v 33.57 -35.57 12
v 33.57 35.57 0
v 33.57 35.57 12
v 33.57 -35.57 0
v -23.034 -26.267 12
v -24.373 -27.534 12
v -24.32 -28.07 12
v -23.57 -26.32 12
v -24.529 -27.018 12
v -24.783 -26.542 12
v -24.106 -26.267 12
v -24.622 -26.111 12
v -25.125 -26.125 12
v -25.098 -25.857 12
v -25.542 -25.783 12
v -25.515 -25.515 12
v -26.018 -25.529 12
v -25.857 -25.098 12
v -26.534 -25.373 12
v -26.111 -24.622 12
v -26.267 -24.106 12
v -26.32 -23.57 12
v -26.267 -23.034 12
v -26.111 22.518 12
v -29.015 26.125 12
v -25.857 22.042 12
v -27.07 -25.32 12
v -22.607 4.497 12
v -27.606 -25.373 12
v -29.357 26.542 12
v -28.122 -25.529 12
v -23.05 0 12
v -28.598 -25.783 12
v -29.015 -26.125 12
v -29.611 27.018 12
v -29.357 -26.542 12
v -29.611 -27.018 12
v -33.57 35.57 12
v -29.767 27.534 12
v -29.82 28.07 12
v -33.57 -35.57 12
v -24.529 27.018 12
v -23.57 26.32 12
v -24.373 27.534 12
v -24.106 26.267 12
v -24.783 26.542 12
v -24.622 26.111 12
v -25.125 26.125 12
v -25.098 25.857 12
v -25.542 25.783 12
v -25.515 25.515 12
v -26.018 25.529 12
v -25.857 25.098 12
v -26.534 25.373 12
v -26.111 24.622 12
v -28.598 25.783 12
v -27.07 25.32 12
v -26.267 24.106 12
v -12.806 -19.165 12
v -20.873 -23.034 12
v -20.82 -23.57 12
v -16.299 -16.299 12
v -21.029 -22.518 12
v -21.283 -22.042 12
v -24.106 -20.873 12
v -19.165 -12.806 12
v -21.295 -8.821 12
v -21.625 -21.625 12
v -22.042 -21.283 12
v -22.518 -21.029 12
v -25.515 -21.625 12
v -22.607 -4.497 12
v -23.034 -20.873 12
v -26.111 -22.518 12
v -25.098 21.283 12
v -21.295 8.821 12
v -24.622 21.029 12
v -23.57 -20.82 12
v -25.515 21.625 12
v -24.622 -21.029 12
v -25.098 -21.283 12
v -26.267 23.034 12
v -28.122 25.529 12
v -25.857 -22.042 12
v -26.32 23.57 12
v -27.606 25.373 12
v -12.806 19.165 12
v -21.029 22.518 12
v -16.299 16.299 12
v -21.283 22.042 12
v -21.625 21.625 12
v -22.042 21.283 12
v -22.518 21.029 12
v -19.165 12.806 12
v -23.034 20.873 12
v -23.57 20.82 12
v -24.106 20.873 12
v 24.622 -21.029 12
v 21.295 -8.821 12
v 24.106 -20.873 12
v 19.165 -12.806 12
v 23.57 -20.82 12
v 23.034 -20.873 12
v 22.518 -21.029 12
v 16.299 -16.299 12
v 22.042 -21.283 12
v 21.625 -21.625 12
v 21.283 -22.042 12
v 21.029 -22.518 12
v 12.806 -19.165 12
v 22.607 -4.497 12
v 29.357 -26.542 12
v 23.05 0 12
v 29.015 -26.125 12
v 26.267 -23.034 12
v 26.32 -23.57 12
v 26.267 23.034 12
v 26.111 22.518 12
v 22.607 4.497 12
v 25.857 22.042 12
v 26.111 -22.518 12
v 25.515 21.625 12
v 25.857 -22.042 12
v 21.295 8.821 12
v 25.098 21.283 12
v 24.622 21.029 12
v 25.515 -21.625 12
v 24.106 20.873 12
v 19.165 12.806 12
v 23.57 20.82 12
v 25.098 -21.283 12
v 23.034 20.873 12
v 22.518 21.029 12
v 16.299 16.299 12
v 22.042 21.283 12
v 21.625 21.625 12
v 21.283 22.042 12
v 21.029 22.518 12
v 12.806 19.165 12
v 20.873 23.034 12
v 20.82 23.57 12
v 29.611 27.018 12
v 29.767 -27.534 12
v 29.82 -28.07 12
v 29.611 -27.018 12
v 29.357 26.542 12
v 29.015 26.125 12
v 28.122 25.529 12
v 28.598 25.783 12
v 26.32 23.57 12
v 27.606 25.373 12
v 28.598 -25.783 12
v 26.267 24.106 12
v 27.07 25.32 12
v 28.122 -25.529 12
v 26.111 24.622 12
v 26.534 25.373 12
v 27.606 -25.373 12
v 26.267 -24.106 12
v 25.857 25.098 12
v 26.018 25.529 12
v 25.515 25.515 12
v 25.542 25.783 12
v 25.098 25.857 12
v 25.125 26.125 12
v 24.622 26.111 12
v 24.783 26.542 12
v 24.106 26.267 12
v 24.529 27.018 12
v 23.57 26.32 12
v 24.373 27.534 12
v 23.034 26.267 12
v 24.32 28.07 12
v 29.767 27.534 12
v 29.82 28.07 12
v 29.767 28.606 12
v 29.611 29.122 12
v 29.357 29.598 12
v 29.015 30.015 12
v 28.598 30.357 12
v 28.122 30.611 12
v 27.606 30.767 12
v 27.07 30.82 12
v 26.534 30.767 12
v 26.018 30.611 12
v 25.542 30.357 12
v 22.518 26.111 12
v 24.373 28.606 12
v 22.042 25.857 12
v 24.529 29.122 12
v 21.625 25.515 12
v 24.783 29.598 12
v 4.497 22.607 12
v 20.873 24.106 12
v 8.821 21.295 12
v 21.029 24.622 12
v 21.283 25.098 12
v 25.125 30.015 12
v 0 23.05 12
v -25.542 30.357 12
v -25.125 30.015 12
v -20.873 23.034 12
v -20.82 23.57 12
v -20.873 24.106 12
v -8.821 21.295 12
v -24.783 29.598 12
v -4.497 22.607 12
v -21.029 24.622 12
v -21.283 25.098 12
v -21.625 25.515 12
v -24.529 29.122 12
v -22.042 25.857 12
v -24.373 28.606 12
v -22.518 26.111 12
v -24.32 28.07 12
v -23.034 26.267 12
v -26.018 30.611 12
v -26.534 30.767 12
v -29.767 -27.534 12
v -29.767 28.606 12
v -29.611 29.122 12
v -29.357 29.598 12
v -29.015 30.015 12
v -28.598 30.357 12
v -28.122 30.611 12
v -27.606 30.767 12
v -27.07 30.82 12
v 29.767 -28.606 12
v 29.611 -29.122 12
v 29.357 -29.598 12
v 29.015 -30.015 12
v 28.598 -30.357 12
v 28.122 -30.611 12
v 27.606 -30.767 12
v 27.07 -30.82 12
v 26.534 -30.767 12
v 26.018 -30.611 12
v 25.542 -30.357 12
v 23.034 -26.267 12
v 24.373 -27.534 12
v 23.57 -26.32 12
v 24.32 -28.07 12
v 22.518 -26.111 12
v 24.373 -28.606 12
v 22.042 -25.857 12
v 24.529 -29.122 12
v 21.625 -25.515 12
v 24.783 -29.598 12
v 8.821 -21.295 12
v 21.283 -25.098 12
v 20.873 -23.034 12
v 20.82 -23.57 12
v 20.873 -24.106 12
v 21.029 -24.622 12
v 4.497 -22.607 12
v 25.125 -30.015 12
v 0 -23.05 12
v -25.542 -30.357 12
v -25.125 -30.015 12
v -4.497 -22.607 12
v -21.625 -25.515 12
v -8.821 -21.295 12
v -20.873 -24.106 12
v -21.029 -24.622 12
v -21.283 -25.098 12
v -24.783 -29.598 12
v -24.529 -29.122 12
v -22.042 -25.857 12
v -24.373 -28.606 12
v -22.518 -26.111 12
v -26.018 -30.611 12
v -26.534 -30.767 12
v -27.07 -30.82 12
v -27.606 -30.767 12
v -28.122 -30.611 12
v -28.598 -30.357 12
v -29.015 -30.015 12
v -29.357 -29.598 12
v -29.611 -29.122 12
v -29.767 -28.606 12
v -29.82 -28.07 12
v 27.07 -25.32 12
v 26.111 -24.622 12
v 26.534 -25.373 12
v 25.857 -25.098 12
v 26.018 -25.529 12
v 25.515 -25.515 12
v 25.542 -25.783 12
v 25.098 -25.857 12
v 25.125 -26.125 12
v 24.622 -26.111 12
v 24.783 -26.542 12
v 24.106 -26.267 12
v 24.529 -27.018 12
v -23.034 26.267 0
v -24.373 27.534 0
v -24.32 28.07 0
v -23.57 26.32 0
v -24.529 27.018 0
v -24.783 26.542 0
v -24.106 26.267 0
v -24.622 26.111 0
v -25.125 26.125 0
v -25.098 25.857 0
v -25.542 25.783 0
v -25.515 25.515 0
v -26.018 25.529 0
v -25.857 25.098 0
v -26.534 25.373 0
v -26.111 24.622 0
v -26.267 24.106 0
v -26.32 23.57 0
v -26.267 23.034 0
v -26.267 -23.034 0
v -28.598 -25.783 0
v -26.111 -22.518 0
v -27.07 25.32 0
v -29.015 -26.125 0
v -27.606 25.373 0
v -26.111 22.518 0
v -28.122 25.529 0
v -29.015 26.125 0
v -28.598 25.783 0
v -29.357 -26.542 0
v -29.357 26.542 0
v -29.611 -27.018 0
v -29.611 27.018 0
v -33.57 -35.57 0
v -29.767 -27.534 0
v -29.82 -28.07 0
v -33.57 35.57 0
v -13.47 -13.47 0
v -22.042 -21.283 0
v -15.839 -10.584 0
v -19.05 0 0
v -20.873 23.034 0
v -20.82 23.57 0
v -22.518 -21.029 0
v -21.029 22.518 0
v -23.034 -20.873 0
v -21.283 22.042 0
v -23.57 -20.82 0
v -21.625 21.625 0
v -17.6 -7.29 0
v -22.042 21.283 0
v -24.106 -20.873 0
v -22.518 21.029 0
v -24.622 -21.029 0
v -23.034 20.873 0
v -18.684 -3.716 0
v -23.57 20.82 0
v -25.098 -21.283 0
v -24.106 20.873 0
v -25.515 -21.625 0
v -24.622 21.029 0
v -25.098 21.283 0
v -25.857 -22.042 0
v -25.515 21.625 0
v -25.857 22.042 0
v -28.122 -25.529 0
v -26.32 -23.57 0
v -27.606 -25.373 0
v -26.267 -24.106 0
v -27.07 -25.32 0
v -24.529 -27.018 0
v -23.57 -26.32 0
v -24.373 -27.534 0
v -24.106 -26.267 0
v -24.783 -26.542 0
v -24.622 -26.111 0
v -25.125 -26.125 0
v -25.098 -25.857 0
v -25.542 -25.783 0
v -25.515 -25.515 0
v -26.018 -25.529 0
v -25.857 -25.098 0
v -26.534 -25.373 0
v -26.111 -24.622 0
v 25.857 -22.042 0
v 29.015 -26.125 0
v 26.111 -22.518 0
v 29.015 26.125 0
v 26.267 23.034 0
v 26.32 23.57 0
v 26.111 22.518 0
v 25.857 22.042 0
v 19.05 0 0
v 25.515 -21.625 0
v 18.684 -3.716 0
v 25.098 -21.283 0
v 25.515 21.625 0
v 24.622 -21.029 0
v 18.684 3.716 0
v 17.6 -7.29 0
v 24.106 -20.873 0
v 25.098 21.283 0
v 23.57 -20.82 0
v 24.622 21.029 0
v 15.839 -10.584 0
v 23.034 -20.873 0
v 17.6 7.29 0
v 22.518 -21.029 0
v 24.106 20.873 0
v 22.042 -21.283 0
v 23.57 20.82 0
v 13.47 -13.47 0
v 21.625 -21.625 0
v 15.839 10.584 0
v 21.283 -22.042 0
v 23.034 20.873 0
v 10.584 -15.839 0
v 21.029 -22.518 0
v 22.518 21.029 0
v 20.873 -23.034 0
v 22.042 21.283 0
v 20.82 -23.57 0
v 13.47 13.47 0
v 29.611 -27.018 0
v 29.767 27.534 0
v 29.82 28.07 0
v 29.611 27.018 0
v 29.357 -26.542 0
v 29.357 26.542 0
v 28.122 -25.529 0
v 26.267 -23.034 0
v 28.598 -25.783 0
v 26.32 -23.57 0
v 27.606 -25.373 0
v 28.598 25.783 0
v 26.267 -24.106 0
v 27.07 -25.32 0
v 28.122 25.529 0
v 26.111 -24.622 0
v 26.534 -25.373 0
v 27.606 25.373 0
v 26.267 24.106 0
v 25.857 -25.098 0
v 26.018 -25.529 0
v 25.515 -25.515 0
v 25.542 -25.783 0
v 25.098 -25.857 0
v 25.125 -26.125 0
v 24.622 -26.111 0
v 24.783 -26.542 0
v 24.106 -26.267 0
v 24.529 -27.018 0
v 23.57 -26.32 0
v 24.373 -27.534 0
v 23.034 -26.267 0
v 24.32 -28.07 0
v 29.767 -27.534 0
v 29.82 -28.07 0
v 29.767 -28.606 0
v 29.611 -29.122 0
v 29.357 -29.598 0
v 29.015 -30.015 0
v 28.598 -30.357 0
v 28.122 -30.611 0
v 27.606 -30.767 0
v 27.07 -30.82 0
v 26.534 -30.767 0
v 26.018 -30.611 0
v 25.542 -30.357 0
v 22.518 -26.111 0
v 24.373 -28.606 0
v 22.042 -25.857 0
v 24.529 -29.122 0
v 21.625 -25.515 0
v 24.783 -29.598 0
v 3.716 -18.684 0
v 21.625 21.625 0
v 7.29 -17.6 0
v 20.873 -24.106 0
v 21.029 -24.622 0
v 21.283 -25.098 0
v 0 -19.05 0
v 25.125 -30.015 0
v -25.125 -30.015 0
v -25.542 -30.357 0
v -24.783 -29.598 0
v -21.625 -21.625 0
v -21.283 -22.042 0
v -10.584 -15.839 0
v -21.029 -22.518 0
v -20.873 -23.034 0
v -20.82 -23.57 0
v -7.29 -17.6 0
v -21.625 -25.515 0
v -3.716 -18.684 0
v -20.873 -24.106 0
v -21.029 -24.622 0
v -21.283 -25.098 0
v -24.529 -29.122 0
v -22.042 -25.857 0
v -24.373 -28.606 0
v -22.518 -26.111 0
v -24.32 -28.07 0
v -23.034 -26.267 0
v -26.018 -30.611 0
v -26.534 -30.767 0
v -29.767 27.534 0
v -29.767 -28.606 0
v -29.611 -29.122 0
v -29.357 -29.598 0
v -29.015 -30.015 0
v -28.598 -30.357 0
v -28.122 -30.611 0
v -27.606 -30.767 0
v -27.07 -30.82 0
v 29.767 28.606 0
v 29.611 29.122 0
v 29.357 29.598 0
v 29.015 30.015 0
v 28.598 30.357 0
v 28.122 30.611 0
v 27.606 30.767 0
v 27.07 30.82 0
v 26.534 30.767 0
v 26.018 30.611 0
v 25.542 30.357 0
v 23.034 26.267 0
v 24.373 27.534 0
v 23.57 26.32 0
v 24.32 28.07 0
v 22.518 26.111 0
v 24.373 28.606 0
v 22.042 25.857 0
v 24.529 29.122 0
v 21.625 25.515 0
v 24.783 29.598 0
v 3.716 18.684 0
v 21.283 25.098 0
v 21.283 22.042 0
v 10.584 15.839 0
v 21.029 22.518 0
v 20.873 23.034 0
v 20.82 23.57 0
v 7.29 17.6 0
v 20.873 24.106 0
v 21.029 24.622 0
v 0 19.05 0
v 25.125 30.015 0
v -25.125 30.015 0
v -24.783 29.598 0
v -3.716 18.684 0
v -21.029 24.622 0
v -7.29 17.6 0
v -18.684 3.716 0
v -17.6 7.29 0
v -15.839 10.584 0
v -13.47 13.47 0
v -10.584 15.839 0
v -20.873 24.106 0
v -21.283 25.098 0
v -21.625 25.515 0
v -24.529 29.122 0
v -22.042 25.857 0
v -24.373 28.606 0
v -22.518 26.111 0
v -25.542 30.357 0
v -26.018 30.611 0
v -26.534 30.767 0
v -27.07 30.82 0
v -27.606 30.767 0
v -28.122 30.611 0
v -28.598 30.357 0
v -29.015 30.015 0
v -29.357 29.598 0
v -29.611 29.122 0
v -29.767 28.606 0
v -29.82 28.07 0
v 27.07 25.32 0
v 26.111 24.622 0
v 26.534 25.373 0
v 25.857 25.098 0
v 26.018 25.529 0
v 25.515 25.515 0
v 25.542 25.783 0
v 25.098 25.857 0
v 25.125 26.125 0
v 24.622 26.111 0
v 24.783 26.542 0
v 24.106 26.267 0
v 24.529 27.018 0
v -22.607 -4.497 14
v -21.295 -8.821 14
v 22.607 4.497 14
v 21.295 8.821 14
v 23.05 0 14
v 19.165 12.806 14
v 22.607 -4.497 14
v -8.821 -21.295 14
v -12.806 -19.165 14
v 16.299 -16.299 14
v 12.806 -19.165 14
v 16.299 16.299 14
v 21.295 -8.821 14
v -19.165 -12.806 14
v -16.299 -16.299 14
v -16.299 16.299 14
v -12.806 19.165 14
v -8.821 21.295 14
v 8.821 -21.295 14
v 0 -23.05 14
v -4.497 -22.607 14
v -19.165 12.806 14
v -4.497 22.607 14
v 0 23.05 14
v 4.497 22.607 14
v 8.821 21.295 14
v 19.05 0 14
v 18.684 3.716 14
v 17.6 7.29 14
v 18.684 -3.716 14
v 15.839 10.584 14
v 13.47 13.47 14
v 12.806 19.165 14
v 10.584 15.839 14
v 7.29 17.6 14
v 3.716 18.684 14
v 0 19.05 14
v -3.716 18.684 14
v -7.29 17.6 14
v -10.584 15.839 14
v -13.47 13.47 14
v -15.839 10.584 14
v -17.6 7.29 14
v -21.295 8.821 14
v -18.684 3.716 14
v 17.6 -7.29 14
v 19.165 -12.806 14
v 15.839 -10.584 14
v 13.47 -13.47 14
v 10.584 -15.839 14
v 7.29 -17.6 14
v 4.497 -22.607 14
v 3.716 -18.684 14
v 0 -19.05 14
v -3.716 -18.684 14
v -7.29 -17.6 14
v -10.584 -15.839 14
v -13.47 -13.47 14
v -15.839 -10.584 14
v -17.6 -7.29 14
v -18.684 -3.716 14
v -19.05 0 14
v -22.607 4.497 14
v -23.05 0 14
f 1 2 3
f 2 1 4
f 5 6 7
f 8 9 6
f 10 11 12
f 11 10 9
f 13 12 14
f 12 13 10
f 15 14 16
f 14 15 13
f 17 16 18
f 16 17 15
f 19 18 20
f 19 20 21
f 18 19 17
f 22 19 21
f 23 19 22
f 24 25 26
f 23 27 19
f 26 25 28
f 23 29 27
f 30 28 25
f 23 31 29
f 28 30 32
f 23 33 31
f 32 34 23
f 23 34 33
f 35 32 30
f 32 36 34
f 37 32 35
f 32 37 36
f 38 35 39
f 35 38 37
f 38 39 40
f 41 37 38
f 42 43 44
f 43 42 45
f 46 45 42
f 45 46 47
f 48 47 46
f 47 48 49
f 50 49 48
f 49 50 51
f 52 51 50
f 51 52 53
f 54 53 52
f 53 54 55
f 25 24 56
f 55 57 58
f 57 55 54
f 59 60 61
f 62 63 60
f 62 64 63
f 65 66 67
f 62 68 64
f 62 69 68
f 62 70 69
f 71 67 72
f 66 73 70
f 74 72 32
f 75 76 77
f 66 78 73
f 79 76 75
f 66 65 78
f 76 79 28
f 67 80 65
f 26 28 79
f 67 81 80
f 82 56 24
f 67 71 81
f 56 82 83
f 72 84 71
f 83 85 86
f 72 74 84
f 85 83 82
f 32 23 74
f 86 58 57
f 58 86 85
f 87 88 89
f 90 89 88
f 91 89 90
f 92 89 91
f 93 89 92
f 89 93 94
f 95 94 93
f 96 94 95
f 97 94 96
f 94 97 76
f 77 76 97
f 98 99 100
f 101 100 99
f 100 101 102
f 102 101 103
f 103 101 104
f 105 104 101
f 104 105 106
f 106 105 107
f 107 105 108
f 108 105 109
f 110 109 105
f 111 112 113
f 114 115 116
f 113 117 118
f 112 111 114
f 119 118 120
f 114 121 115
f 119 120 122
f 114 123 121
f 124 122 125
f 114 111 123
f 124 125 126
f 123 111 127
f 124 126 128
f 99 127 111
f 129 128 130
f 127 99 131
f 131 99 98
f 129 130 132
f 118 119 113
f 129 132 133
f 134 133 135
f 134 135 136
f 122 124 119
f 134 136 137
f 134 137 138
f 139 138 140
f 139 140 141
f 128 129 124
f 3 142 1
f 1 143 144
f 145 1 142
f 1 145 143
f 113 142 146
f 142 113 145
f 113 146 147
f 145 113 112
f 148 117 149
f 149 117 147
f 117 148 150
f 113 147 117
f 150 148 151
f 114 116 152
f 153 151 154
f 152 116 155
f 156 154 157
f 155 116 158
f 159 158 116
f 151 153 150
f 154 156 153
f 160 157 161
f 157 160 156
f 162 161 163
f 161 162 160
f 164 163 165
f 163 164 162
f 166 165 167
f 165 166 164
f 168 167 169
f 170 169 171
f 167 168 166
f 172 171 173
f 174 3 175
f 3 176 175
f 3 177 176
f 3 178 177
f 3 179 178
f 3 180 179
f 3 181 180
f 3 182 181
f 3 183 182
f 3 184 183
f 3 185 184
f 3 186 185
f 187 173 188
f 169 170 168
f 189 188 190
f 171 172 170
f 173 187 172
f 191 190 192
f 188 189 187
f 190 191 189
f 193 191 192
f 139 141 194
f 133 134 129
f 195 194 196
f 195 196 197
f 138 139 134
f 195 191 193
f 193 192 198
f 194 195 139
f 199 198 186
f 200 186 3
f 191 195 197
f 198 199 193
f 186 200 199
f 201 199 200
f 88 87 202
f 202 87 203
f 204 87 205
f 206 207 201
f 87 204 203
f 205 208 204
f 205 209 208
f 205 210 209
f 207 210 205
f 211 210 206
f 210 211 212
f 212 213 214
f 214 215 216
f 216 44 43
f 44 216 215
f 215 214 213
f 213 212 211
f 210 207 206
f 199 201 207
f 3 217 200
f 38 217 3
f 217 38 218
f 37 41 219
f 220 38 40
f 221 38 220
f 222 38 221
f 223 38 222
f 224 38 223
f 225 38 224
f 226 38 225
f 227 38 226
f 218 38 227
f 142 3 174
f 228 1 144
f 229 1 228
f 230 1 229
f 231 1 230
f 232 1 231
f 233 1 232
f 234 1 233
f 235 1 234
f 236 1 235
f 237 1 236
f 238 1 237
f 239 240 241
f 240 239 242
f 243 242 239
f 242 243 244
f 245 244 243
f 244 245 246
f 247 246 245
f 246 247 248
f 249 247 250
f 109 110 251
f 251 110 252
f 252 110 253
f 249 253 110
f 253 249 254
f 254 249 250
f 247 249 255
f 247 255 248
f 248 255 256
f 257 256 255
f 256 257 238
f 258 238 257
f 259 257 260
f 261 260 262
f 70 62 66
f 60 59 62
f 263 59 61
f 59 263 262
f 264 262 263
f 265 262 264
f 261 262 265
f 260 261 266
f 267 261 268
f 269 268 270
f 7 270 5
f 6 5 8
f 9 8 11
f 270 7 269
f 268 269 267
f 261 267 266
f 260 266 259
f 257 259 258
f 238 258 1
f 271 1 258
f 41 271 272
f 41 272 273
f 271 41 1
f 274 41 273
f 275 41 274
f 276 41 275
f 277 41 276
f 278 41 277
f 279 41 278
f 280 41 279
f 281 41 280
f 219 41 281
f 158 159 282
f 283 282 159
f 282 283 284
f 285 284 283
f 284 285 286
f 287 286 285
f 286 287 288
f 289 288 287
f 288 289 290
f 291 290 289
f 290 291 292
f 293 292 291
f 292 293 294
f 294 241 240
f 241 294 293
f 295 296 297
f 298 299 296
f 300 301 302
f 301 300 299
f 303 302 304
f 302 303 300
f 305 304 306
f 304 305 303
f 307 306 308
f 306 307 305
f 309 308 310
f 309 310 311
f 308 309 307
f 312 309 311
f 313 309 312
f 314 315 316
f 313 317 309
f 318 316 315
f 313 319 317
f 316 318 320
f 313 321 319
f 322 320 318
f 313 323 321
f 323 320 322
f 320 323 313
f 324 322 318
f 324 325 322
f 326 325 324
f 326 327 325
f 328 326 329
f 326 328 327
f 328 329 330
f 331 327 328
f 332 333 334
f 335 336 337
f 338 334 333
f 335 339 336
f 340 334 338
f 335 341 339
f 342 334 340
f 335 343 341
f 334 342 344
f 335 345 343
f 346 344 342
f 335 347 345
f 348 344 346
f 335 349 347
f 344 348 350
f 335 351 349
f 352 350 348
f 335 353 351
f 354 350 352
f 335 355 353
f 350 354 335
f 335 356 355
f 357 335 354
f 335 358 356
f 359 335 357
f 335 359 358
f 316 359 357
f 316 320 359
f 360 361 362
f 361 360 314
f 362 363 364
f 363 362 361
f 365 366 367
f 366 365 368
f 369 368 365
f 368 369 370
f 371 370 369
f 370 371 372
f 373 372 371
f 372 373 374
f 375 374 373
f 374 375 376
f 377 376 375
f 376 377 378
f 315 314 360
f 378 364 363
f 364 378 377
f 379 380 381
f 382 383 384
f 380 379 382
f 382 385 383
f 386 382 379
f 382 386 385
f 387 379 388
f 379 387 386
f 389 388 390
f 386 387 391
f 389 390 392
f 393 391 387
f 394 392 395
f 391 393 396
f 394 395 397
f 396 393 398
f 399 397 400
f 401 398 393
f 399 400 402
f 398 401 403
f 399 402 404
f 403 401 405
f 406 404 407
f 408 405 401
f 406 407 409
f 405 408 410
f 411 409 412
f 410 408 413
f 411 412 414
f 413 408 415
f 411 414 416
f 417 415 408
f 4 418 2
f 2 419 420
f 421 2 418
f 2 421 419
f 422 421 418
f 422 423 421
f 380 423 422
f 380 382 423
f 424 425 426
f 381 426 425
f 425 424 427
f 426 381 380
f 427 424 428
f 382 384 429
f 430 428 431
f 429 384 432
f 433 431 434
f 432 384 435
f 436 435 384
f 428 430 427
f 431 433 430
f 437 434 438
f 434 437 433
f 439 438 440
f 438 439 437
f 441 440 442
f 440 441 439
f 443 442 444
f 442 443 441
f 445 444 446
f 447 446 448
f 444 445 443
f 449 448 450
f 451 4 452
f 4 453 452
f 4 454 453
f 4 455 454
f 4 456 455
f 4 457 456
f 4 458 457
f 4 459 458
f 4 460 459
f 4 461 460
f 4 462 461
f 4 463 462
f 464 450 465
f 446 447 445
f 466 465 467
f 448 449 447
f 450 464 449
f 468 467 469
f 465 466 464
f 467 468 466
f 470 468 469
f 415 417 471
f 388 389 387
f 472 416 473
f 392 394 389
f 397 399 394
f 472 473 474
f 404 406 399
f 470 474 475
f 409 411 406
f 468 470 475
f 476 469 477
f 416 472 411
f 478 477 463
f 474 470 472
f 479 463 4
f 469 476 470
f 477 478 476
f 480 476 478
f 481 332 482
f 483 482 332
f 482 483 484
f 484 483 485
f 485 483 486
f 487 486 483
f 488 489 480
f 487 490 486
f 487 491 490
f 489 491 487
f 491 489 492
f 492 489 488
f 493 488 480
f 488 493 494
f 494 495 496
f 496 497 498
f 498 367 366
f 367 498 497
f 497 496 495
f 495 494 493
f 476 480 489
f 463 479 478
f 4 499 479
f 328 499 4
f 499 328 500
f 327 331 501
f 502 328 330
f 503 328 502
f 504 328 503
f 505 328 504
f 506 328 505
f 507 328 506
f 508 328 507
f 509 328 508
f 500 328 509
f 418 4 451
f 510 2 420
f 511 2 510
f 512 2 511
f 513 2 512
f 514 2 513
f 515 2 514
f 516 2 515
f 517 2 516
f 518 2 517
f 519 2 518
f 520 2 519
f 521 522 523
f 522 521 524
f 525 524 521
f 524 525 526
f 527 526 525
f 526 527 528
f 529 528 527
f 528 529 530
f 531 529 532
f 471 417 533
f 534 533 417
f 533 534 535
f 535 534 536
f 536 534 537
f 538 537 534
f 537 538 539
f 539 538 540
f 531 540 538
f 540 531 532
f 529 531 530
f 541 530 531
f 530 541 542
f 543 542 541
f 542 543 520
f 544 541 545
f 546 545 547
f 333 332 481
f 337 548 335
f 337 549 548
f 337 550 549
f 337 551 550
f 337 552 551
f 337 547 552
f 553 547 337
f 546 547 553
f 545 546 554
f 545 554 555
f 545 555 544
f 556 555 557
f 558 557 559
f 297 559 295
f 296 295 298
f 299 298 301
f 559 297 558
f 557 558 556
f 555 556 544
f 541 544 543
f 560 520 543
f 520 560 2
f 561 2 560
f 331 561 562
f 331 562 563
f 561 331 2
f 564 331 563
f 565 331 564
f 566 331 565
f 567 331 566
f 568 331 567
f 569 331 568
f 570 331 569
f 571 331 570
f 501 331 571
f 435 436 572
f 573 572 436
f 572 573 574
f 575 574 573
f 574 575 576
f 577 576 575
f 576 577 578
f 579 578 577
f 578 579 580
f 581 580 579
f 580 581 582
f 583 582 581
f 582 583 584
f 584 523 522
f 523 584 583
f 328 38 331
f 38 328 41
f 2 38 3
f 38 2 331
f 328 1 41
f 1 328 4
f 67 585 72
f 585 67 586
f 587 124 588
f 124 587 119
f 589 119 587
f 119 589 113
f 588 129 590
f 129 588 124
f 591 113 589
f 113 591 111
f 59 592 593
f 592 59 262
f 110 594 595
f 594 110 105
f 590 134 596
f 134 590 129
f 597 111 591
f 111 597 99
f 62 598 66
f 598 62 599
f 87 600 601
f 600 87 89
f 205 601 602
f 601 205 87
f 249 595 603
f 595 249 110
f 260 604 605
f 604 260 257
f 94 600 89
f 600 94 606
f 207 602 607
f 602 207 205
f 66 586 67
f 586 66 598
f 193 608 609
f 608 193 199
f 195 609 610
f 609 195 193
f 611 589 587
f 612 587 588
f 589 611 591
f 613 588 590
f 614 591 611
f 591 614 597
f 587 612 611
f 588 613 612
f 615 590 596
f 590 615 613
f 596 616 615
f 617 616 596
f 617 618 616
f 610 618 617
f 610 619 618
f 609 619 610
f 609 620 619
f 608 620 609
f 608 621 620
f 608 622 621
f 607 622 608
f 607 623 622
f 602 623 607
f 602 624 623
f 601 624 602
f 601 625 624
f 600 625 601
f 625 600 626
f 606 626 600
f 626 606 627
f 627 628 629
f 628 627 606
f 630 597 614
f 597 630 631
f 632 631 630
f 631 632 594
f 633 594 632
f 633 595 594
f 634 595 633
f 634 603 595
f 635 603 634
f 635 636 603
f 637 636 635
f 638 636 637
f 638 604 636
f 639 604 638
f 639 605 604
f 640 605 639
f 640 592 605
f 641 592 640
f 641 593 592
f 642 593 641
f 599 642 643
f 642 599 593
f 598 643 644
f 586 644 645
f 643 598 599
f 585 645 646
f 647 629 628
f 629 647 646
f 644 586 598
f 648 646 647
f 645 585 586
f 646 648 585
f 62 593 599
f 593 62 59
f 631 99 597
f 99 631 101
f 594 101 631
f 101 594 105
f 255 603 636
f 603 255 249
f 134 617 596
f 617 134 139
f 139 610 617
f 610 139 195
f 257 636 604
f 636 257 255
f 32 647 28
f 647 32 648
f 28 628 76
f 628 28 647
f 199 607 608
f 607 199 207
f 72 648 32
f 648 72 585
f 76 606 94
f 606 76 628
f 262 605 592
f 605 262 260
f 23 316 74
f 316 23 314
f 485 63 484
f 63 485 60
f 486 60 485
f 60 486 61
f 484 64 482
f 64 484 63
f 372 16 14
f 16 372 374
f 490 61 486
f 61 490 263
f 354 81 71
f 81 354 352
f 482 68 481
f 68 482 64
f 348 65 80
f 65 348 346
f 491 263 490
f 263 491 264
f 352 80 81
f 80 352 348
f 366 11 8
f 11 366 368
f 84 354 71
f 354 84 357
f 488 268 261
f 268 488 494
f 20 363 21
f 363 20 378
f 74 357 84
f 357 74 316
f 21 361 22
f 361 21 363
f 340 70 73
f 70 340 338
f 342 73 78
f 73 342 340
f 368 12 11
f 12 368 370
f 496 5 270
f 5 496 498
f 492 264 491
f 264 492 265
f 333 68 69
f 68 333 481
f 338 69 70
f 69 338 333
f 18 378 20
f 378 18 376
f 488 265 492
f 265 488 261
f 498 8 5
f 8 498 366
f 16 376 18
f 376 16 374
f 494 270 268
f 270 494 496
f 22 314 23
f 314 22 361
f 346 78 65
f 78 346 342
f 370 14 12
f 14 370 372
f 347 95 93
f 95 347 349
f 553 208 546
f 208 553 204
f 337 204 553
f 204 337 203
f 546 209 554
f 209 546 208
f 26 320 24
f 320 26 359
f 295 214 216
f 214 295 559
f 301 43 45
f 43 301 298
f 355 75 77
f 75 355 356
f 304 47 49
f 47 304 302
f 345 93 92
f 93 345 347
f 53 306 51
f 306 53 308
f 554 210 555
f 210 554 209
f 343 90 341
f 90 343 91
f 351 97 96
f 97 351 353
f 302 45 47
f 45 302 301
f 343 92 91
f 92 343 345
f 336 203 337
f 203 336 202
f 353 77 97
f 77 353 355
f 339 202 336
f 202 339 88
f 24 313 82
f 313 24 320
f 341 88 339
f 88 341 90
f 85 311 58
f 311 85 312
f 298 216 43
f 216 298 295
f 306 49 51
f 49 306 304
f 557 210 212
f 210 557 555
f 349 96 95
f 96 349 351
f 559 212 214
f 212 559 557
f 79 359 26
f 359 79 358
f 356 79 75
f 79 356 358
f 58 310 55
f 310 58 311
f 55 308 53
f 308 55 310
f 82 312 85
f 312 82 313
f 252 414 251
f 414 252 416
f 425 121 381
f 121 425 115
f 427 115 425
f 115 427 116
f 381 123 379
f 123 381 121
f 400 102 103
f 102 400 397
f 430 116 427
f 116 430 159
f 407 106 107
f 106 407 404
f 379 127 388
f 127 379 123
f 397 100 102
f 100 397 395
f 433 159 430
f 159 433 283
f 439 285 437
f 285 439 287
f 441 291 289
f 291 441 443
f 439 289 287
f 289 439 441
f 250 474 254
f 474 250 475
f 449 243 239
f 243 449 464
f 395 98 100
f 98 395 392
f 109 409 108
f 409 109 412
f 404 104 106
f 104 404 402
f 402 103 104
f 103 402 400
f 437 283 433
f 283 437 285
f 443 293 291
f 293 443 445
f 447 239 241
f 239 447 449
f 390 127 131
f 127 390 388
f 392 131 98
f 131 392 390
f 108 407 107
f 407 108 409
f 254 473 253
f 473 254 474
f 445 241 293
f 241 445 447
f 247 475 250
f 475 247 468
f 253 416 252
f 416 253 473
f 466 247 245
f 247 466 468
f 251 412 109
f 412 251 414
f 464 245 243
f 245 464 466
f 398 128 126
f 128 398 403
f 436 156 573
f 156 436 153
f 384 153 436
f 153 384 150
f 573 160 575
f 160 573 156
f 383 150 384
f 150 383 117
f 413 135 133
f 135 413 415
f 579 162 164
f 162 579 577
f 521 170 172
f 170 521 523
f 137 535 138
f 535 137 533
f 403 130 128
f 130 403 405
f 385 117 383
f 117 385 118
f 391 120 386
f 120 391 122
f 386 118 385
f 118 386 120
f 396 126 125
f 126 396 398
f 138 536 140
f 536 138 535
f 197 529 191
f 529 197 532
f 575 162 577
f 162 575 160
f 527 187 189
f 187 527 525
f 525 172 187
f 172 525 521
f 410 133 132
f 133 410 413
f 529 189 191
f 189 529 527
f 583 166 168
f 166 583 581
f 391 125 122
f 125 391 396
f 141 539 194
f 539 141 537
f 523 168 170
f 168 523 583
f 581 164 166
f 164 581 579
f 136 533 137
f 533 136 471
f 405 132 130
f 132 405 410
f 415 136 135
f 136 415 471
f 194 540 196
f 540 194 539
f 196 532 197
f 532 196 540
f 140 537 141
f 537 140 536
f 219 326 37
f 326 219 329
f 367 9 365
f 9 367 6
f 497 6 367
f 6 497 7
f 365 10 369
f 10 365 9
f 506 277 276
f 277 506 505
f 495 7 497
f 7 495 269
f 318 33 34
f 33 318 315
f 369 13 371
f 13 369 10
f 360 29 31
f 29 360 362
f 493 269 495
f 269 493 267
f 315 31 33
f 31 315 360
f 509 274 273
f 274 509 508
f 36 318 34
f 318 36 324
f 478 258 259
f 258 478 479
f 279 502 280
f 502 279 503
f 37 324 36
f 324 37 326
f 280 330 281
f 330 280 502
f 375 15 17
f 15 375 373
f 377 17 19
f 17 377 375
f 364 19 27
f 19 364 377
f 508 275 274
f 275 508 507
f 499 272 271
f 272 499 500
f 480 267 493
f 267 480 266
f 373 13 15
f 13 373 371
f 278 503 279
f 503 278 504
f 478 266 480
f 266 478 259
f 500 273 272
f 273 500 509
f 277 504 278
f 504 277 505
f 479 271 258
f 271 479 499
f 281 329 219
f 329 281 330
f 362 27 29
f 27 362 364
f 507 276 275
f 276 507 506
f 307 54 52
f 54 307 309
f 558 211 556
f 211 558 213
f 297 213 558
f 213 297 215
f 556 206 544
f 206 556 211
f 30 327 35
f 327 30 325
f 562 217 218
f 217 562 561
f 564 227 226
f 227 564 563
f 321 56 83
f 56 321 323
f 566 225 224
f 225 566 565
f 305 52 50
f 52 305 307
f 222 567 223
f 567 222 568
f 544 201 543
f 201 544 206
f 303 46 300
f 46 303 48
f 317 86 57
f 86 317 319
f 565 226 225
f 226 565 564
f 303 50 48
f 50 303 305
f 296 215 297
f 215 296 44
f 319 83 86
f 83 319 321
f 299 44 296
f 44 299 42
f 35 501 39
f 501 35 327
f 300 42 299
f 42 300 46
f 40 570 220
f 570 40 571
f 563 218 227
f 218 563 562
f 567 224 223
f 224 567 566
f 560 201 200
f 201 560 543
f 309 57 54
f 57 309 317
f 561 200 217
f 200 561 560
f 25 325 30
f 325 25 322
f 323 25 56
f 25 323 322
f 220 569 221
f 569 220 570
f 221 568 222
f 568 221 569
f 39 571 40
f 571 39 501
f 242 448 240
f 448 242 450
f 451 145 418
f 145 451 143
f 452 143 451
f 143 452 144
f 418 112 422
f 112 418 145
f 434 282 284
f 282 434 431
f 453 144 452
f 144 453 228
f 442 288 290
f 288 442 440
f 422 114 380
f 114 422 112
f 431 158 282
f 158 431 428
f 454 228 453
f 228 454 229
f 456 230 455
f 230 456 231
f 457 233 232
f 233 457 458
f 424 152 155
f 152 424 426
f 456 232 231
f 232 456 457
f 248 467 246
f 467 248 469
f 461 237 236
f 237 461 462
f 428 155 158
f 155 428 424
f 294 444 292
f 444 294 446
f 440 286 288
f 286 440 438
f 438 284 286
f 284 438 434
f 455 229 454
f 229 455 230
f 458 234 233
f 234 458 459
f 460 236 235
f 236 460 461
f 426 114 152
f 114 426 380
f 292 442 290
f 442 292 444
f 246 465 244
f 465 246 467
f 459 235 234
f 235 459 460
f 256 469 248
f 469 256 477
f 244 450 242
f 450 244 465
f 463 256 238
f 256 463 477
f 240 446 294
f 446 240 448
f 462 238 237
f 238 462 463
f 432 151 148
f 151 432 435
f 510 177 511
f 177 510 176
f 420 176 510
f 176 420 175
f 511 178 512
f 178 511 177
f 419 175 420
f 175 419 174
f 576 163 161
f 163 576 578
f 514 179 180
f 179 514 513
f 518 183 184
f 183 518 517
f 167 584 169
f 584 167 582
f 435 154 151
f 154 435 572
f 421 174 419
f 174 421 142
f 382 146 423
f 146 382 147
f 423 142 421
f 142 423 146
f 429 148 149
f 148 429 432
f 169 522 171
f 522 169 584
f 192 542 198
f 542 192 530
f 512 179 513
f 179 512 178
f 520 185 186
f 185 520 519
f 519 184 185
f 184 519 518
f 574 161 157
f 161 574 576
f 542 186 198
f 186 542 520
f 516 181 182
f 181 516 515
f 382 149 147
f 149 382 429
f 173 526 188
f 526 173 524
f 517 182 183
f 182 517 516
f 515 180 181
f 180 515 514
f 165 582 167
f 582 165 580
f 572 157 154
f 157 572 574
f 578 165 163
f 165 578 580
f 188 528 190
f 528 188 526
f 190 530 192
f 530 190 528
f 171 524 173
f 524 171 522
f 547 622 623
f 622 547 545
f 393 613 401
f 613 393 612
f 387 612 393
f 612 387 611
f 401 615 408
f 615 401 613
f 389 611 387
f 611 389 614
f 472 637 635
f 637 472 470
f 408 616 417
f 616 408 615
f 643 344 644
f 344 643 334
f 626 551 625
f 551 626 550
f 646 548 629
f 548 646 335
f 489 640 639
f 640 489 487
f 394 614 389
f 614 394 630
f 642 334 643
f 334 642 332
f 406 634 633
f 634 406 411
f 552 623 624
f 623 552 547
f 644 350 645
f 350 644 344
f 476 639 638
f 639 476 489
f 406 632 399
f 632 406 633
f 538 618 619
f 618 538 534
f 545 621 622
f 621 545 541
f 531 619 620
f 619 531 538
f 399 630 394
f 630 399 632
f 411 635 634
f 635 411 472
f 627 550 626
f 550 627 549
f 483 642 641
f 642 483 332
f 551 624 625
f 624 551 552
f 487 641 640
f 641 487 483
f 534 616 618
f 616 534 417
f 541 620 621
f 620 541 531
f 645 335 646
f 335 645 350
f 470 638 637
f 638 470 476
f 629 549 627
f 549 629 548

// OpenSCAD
$fn = 32;

// ----------------------------------------------------------------------
// Motor mount plate: NEMA23, 67.14 x 71.14 x 14 mm
// ----------------------------------------------------------------------

// --- parameters (mm) ---
mount_w = 67.14;          // plate length, X
mount_d = 71.14;          // plate width, Y
mat_t = 12;               // plate thickness
motor_pitch = 47.14;      // NEMA23 bolt spacing
motor_d = 5.5;            // NEMA23 screw clearance
center_bore = 38.1;       // pilot boss bore
boss_d = 46.1;            // raised pilot ring
boss_h = 2;               // raised pilot ring height
second_d = 5.5;           // second fastener hole

module plate() {
  translate([-mount_w / 2, -mount_d / 2, 0]) cube([mount_w, mount_d, mat_t]);
}

module motor_holes() {
  for (sx = [-1, 1]) for (sy = [-1, 1])
    translate([sx * motor_pitch / 2, sy * motor_pitch / 2, -1])
      cylinder(h = mat_t + 2, d = motor_d);
}
module pilot_ring() {
  translate([0, 0, mat_t - 1]) cylinder(h = boss_h + 1, d = boss_d);
}

difference() {
  union() {
    plate();
    pilot_ring();
  }
  motor_holes();
  translate([0, 0, -1]) cylinder(h = mat_t + boss_h + 2, d = center_bore);
  for (sx = [-1, 1]) for (sy = [-1, 1])
    translate([sx * 27.07, sy * 28.07, -1]) cylinder(h = mat_t + 2, d = second_d);
}
